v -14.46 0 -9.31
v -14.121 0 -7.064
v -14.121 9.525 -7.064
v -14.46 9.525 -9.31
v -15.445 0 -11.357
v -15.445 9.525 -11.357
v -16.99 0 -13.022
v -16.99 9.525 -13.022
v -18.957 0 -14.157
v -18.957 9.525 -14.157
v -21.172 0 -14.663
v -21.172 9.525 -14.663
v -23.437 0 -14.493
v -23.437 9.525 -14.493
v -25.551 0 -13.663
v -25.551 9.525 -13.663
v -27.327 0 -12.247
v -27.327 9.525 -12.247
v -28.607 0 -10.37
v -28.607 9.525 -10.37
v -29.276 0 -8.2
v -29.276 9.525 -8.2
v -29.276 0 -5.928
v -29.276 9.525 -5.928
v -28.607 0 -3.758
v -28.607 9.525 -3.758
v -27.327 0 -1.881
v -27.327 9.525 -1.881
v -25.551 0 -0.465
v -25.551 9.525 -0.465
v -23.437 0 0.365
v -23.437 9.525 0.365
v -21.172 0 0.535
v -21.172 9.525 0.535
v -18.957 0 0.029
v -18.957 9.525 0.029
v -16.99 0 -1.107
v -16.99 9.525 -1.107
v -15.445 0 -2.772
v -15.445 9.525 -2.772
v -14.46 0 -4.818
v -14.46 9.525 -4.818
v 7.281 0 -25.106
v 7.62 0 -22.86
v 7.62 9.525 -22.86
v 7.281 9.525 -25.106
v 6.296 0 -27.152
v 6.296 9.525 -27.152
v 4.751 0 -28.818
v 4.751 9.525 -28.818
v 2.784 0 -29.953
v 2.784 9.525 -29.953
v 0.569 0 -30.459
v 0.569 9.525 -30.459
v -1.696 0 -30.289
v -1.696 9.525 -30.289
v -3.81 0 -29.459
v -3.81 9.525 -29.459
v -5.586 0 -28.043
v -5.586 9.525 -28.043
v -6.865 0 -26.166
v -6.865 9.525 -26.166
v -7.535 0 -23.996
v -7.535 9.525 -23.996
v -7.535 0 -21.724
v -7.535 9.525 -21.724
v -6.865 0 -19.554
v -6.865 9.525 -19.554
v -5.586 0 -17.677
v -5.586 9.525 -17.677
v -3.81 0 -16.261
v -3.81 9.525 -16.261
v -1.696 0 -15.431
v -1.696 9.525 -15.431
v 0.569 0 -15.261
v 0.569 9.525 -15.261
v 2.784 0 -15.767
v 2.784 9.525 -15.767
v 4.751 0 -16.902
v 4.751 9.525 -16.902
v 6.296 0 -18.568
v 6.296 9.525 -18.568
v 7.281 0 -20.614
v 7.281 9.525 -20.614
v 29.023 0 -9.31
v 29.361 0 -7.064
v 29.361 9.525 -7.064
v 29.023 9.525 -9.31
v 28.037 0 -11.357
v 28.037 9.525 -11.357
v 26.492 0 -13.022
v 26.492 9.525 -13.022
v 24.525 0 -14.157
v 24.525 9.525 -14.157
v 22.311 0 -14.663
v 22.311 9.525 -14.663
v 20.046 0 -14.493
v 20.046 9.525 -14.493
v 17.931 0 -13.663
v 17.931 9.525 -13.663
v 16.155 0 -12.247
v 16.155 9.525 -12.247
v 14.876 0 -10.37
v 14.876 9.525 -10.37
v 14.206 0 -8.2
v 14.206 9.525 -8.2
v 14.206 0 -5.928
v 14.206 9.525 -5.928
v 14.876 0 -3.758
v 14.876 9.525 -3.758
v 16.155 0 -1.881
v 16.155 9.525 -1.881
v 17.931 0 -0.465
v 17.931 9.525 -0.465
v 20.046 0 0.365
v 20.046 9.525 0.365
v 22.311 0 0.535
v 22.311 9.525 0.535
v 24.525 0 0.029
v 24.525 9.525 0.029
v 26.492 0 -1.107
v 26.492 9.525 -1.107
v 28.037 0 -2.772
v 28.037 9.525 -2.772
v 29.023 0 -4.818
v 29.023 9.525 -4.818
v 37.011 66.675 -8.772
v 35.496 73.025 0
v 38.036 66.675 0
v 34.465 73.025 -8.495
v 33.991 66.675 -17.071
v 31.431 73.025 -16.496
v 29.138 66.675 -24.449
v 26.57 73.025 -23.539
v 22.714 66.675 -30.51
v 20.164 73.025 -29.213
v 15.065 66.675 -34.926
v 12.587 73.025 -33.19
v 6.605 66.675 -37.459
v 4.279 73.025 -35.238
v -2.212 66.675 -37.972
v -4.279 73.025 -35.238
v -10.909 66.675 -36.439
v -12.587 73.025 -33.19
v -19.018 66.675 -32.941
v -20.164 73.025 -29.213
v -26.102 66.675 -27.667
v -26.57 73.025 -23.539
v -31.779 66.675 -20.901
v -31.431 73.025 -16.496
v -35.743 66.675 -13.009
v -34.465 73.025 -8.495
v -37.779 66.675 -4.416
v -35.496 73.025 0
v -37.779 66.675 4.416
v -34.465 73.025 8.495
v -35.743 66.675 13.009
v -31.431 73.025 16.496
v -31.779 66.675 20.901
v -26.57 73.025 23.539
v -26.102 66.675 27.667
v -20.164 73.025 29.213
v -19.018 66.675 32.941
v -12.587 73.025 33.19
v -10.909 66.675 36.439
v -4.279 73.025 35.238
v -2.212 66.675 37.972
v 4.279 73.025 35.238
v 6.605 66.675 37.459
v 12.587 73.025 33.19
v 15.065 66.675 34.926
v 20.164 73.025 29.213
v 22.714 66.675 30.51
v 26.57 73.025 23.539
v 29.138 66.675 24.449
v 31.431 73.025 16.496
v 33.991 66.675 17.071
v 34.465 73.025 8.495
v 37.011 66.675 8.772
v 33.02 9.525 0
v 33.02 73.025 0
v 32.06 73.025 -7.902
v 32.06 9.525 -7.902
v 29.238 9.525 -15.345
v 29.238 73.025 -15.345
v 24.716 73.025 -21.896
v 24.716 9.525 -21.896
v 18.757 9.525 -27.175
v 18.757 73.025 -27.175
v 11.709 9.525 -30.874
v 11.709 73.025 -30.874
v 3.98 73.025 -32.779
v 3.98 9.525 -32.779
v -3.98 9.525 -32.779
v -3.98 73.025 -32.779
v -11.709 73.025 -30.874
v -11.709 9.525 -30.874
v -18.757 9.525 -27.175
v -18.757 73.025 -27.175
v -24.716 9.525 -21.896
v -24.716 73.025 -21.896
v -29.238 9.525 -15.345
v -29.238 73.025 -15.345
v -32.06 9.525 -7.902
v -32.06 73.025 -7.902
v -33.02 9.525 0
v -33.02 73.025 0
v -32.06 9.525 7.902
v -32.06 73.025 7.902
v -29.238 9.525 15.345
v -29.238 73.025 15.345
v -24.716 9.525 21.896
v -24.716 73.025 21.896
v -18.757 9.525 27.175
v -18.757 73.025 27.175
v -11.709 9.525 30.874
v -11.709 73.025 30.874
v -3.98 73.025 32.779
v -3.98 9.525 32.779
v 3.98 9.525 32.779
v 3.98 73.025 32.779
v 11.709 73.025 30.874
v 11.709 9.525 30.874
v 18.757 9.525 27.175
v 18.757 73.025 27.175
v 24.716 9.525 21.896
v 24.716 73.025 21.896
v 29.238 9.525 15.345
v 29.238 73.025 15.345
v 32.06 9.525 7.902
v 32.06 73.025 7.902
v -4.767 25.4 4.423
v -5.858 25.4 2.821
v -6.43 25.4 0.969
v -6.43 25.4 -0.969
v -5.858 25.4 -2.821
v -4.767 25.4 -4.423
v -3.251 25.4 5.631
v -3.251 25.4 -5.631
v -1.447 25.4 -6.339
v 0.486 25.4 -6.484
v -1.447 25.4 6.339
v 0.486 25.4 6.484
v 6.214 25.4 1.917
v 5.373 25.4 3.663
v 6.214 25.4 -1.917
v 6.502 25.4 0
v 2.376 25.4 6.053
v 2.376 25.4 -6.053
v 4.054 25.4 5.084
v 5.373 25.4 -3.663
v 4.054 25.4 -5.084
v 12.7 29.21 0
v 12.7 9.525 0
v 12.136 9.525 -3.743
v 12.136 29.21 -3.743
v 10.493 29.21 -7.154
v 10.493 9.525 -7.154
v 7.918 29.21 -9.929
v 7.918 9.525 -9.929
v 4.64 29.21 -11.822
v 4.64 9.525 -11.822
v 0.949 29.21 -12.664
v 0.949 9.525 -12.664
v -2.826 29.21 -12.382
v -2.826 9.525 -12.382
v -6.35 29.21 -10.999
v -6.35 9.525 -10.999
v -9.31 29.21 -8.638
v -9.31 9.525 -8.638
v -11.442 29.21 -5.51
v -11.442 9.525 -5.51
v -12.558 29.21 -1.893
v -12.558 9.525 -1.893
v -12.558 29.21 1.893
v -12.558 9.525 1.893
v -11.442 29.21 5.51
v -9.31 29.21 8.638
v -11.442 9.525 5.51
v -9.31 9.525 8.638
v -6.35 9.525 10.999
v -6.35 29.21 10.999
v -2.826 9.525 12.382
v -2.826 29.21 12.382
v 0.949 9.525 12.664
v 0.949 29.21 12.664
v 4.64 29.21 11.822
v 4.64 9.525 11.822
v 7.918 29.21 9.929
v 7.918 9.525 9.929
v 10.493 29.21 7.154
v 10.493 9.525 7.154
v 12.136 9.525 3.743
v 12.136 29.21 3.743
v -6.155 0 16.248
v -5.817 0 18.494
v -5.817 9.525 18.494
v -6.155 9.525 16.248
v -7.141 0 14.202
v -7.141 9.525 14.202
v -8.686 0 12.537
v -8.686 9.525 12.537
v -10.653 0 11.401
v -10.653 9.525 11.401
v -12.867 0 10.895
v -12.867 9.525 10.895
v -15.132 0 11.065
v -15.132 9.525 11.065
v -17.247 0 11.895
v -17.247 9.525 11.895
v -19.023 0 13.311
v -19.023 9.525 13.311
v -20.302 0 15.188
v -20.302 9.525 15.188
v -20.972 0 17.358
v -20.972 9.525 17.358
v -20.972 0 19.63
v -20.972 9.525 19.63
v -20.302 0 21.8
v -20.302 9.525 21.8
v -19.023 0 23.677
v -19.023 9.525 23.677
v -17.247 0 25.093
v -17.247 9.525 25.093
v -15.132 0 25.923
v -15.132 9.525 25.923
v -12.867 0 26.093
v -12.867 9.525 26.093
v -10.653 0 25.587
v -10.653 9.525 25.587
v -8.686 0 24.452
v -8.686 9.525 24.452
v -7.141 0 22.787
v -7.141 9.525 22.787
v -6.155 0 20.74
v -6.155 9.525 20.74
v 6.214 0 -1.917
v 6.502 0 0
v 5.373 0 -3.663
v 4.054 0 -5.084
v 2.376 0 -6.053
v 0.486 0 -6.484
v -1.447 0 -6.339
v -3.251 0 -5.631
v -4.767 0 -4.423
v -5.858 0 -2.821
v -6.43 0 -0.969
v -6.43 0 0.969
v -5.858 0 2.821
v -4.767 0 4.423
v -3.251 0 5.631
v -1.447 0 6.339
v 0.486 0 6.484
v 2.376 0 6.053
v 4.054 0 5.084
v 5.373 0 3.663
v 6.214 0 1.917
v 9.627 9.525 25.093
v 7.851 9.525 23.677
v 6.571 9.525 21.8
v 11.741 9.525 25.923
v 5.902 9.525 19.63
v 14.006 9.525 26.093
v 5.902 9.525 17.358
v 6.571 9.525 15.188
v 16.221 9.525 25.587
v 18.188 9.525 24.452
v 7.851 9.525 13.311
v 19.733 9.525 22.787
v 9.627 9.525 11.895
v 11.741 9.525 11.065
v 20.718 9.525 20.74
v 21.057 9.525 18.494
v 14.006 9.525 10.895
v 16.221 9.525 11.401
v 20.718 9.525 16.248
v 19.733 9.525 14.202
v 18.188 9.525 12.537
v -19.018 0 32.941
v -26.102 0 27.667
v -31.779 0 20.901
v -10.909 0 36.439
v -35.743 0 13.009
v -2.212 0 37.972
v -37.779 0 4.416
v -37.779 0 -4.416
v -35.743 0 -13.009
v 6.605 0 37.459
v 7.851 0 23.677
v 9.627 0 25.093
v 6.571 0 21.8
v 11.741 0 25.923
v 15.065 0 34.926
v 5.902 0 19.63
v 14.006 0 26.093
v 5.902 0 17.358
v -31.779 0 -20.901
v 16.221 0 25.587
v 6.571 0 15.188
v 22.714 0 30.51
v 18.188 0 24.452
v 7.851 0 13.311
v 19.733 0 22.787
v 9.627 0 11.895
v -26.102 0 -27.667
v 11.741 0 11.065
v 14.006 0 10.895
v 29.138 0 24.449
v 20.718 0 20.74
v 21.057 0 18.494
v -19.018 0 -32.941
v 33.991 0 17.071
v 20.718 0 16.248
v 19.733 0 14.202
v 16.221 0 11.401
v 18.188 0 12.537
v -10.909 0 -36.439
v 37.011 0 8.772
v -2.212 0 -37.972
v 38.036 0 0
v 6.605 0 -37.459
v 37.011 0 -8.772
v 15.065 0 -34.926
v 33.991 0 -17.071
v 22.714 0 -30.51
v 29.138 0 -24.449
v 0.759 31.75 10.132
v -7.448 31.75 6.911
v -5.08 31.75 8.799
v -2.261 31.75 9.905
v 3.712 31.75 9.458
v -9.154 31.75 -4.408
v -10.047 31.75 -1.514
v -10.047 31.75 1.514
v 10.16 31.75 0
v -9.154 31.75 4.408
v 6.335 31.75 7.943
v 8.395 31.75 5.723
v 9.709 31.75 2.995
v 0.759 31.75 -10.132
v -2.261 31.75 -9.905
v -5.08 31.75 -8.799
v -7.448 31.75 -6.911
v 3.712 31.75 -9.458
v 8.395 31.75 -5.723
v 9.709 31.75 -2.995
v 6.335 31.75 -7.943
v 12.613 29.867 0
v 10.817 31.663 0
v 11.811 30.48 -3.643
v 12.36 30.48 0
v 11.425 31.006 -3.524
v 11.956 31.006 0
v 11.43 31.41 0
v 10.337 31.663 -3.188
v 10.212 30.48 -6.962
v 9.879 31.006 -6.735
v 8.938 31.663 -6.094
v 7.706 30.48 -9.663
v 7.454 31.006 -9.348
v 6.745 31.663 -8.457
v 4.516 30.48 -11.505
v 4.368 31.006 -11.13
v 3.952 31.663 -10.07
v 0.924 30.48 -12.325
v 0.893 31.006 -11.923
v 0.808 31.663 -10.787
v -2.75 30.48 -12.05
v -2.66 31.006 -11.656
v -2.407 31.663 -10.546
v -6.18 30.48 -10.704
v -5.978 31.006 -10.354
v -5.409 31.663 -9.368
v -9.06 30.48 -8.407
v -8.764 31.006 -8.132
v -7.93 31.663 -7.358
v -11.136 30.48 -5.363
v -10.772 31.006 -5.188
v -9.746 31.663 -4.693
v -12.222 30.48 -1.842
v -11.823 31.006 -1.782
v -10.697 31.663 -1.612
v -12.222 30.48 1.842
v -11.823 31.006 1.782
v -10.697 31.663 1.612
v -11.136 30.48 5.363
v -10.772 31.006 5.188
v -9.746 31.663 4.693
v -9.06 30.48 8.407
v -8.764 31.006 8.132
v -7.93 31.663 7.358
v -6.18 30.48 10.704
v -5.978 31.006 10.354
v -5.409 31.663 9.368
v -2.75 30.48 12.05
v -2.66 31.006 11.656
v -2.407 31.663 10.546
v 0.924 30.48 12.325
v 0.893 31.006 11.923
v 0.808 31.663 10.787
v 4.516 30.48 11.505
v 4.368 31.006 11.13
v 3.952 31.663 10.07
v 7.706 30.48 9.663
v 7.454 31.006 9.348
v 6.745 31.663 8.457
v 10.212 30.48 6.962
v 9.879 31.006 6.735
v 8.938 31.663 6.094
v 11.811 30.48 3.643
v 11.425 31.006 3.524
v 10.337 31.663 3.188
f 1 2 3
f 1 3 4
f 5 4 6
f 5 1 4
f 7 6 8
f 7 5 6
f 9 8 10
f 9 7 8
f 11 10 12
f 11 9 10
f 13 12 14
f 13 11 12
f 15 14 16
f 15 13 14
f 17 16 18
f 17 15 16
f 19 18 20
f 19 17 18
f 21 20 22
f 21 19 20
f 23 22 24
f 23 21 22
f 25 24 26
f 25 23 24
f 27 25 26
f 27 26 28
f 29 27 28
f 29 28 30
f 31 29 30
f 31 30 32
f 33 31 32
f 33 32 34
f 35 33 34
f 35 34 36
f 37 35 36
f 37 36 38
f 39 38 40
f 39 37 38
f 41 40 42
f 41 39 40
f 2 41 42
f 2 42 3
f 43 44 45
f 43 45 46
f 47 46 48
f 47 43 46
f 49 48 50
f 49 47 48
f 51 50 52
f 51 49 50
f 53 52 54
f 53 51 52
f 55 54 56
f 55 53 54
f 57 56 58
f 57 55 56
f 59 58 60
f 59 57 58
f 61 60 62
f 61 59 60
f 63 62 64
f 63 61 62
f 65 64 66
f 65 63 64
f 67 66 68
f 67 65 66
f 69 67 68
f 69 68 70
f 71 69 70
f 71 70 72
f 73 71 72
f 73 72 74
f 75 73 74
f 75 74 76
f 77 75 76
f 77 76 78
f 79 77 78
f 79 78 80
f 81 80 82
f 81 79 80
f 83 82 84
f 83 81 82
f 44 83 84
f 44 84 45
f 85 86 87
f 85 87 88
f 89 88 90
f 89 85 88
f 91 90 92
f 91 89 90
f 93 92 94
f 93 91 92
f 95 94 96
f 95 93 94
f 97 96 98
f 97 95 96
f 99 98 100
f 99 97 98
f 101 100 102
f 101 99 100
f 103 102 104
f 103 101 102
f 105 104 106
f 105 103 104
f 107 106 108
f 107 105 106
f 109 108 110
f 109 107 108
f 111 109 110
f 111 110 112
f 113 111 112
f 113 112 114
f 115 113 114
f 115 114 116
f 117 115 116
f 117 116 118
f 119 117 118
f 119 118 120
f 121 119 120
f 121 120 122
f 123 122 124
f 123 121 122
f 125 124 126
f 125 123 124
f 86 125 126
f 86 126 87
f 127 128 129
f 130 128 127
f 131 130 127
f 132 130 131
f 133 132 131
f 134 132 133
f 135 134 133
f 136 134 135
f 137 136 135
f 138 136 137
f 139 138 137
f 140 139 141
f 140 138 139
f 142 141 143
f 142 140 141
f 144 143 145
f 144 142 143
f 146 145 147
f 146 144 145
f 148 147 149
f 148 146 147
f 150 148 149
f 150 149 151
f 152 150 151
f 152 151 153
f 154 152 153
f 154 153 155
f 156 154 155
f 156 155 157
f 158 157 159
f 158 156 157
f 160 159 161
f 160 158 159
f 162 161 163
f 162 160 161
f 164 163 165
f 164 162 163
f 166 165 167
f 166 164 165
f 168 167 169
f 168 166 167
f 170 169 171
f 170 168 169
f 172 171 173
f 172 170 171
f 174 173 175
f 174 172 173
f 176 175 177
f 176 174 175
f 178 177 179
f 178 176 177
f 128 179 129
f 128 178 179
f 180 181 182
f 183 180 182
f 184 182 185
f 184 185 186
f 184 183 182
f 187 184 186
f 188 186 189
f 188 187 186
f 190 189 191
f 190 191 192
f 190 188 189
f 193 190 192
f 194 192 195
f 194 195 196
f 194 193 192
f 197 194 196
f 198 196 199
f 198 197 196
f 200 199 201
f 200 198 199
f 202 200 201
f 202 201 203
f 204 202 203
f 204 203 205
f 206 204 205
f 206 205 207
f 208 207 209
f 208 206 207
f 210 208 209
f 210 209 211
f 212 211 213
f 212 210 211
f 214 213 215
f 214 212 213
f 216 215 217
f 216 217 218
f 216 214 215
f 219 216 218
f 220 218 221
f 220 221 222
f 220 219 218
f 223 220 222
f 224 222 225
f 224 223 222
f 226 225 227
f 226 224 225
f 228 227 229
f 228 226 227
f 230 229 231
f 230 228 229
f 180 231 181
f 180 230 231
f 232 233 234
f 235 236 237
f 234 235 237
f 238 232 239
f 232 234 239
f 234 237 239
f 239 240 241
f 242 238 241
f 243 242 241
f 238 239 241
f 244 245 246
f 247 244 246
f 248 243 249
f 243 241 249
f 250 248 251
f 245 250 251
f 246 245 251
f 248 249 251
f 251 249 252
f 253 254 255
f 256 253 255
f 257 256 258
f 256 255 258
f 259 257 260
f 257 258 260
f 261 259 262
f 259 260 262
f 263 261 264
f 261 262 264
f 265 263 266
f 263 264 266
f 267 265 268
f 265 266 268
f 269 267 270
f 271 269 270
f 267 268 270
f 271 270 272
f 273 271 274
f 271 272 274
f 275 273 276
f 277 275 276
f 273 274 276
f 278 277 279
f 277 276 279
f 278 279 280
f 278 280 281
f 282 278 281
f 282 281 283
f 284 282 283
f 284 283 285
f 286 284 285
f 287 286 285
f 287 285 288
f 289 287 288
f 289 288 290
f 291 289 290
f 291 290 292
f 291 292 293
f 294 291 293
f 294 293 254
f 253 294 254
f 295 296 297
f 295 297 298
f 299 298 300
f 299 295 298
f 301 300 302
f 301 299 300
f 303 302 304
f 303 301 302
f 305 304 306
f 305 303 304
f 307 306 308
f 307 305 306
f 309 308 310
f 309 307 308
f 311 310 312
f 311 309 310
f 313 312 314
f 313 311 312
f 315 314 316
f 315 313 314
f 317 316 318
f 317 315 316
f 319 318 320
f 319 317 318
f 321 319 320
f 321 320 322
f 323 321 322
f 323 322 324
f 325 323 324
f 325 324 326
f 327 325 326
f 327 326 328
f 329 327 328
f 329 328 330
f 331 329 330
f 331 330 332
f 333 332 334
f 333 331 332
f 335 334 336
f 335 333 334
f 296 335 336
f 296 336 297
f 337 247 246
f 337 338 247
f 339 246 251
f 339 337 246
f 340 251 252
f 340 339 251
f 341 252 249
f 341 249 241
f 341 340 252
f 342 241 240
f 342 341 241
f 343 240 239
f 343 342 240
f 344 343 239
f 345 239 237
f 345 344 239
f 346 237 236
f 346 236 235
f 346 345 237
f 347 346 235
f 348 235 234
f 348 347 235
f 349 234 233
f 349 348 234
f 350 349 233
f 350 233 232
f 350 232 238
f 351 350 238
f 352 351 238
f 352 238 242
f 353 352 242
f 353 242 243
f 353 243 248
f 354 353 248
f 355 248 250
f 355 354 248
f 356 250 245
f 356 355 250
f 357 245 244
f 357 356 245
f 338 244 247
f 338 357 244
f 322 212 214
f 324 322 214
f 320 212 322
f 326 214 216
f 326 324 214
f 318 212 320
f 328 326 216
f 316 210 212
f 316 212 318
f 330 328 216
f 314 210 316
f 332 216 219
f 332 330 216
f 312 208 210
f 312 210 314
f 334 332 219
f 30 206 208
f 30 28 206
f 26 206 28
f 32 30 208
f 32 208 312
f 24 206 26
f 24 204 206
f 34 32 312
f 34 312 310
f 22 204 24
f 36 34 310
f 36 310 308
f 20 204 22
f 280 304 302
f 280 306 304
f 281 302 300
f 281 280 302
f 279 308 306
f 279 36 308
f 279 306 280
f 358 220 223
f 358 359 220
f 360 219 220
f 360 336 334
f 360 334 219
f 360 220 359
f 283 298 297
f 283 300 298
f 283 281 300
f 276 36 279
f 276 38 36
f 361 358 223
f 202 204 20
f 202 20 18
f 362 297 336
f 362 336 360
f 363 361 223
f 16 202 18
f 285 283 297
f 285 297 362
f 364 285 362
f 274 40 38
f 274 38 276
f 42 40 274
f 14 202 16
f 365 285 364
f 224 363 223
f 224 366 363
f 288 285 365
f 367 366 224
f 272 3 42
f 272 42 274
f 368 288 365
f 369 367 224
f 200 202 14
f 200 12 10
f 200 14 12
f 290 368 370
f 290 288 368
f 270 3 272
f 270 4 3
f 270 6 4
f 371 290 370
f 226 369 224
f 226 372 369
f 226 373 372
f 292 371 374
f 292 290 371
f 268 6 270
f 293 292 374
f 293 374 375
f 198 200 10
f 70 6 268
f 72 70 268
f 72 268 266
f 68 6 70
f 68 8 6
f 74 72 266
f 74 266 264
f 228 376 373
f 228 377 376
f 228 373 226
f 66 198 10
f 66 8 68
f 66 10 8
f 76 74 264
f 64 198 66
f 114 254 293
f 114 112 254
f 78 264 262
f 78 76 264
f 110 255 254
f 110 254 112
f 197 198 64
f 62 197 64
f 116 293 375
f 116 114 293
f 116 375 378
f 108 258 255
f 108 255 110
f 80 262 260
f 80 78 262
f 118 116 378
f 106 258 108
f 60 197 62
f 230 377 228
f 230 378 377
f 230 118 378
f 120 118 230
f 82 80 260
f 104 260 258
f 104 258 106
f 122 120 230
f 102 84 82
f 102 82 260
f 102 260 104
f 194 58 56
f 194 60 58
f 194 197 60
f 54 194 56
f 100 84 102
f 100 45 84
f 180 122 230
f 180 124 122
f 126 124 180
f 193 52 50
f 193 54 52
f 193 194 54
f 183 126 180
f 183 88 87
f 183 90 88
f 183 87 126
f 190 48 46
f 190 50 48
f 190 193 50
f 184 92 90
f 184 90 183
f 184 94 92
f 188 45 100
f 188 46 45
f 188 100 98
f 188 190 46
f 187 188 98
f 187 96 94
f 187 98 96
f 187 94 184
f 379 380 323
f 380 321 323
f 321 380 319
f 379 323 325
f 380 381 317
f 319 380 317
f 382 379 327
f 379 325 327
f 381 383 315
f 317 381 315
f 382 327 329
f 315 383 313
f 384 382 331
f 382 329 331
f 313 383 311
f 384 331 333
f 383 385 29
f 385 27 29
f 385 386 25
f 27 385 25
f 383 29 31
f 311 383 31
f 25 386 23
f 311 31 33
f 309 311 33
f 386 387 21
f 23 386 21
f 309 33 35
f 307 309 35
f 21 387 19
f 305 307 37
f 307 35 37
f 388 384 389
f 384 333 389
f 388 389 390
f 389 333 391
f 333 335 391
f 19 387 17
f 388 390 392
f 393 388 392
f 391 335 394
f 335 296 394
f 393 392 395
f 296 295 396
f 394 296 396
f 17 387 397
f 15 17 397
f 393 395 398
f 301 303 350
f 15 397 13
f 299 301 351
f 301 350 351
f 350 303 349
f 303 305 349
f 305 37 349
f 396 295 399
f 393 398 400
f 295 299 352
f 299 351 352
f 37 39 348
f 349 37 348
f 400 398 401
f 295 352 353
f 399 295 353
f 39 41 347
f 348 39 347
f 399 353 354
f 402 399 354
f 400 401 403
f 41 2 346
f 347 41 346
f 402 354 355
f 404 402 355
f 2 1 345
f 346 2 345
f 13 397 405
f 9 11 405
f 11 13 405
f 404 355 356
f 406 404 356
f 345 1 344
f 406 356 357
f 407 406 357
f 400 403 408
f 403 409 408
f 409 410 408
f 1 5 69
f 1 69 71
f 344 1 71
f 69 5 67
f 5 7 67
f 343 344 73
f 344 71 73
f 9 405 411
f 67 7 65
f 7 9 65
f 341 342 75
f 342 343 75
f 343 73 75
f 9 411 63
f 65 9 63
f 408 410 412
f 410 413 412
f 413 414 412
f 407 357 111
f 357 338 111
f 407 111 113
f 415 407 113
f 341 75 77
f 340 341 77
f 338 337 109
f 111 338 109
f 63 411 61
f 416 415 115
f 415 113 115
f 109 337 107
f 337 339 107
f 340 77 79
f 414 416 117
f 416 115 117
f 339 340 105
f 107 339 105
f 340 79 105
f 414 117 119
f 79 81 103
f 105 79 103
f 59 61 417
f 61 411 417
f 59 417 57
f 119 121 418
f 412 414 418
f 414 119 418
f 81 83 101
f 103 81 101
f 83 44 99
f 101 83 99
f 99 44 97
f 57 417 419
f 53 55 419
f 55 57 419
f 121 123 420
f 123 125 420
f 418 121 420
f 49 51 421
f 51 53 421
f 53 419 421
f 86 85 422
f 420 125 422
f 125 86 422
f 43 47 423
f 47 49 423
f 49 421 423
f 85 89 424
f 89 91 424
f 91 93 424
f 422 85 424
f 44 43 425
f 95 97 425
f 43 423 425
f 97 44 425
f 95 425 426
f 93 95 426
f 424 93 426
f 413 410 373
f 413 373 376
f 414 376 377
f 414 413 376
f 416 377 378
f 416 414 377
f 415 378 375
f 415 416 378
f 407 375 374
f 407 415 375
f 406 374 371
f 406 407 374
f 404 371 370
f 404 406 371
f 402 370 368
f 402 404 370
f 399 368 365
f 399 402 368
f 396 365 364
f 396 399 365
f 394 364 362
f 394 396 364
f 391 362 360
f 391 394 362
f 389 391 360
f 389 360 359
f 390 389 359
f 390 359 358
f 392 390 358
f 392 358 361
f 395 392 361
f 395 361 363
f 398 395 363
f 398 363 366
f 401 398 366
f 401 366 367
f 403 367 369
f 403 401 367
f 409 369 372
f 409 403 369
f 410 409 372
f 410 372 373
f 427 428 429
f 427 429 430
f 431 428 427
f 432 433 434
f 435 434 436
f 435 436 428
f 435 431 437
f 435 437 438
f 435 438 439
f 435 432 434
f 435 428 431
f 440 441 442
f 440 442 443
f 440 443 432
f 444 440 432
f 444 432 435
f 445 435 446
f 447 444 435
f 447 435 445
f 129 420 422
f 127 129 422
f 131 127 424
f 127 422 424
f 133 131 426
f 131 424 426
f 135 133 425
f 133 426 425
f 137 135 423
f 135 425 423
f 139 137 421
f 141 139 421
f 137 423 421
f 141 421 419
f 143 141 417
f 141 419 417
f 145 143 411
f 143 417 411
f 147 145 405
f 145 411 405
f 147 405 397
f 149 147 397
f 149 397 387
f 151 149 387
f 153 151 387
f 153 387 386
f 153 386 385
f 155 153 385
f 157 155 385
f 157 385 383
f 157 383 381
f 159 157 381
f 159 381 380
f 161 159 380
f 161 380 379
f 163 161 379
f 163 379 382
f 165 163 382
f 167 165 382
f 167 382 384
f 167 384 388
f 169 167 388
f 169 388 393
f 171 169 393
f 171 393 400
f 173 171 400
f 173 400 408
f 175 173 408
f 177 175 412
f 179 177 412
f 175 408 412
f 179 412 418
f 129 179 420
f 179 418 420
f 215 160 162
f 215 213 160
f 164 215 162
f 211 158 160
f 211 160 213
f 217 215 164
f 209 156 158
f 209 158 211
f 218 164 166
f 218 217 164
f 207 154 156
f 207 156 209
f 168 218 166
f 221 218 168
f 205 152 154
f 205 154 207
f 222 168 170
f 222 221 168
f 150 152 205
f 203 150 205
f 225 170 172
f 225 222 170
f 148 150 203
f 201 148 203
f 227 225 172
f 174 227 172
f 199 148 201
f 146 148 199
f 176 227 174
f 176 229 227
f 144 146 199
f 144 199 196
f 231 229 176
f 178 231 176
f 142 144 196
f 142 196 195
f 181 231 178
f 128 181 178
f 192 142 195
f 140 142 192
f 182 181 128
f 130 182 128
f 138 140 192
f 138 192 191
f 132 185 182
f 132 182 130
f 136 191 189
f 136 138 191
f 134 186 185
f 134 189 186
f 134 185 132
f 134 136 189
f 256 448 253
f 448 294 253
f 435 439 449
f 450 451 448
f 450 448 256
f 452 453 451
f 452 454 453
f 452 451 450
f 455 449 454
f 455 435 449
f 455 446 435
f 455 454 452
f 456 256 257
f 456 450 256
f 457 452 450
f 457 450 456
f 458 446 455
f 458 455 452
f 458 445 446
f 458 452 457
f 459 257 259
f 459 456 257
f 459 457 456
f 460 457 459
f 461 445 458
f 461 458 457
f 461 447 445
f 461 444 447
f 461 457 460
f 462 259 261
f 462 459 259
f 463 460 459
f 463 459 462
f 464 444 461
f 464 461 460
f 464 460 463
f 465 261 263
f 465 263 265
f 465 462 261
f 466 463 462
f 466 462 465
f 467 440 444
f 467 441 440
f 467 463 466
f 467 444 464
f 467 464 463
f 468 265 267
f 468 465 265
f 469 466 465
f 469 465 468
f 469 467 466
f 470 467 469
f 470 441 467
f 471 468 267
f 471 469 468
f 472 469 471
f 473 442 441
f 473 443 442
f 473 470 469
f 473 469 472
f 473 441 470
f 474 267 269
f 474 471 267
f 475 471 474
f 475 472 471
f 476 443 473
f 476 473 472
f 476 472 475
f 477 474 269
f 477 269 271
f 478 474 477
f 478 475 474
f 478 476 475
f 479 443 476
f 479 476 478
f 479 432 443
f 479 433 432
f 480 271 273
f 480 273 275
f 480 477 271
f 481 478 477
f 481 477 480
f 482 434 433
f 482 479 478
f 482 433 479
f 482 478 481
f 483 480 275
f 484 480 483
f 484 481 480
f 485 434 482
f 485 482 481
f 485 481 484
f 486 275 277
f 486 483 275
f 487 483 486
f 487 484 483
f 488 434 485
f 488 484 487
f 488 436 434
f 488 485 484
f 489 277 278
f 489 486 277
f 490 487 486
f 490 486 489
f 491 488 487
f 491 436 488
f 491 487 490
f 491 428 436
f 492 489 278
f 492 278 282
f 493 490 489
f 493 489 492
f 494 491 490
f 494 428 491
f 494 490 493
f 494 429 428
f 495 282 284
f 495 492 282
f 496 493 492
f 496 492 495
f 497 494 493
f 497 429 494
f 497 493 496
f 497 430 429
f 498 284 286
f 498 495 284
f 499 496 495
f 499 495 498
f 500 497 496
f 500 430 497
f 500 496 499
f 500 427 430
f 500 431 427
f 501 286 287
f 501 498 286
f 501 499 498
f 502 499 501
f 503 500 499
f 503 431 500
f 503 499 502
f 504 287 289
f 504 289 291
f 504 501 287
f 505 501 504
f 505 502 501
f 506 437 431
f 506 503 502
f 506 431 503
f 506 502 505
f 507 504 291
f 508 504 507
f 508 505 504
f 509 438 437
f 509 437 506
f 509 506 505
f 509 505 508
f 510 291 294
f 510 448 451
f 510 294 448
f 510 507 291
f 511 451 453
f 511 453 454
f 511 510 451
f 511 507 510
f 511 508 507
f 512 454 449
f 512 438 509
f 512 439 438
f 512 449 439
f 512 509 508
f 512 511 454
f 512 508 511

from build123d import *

# Parameters (mm, degrees)
SKETCH1_R           = 38.0365
SKETCH1_R_2         = 6.5024
SKETCH1_R_3         = 7.62
BOSS_EXTRUDE1_DEPTH = 9.525
SKETCH2_R           = 38.0365
SKETCH2_R_2         = 33.02
BOSS_EXTRUDE2_DEPTH = 63.5
SKETCH3_R           = 12.7
SKETCH3_R_2         = 6.5024
BOSS_EXTRUDE3_DEPTH = 15.875
CHAMFER1_SIZE       = 6.35
CHAMFER1_SIZE2      = 2.54
SKETCH4_R           = 12.7
BOSS_EXTRUDE4_DEPTH = 6.35
FILLET1_R           = 2.54


with BuildPart() as part:
    # Sketch1 → Boss-Extrude1 (new body)
    with BuildSketch(Plane(origin=(0, 0, 0), x_dir=(1, 0, 0), z_dir=(0, 1, 0))):
        Circle(SKETCH1_R)
        Circle(SKETCH1_R_2, mode=Mode.SUBTRACT)
        with Locations((0, 22.86)):
            Circle(SKETCH1_R_3, mode=Mode.SUBTRACT)
        with Locations((21.741151963, 7.064128491)):
            Circle(SKETCH1_R_3, mode=Mode.SUBTRACT)
        with Locations((13.436770867, -18.494128491)):
            Circle(SKETCH1_R_3, mode=Mode.SUBTRACT)
        with Locations((-13.436770867, -18.494128491)):
            Circle(SKETCH1_R_3, mode=Mode.SUBTRACT)
        with Locations((-21.741151963, 7.064128491)):
            Circle(SKETCH1_R_3, mode=Mode.SUBTRACT)
    extrude(amount=BOSS_EXTRUDE1_DEPTH)

    # Sketch2 → Boss-Extrude2 (add)
    with BuildSketch(Plane(origin=(0, 9.525, 0), x_dir=(1, 0, 0), z_dir=(0, 1, 0))):
        Circle(SKETCH2_R)
        Circle(SKETCH2_R_2, mode=Mode.SUBTRACT)
    extrude(amount=BOSS_EXTRUDE2_DEPTH)

    # Sketch3 → Boss-Extrude3 (add)
    with BuildSketch(Plane(origin=(0, 9.525, 0), x_dir=(1, 0, 0), z_dir=(0, 1, 0))):
        Circle(SKETCH3_R)
        Circle(SKETCH3_R_2, mode=Mode.SUBTRACT)
    extrude(amount=BOSS_EXTRUDE3_DEPTH)

    # Chamfer1
    chamfer1_edges = [part.edges().sort_by_distance(p)[0] for p in [
        (-38.0365, 73.025, 0),
    ]]
    chamfer1_side = [part.faces().sort_by_distance(p)[0] for p in [
        (-38.0365, 36.5125, 0),
    ]]
    chamfer(chamfer1_edges, length=CHAMFER1_SIZE, length2=CHAMFER1_SIZE2, reference=chamfer1_side[0])

    # Sketch4 → Boss-Extrude4 (add)
    with BuildSketch(Plane(origin=(0, 25.4, 0), x_dir=(1, 0, 0), z_dir=(0, 1, 0))):
        Circle(SKETCH4_R)
    extrude(amount=BOSS_EXTRUDE4_DEPTH)

    # Fillet1
    fillet1_edges = [part.edges().sort_by_distance(p)[0] for p in [
        (-12.7, 31.75, 0),
    ]]
    fillet(fillet1_edges, radius=FILLET1_R)


solid = part.part
